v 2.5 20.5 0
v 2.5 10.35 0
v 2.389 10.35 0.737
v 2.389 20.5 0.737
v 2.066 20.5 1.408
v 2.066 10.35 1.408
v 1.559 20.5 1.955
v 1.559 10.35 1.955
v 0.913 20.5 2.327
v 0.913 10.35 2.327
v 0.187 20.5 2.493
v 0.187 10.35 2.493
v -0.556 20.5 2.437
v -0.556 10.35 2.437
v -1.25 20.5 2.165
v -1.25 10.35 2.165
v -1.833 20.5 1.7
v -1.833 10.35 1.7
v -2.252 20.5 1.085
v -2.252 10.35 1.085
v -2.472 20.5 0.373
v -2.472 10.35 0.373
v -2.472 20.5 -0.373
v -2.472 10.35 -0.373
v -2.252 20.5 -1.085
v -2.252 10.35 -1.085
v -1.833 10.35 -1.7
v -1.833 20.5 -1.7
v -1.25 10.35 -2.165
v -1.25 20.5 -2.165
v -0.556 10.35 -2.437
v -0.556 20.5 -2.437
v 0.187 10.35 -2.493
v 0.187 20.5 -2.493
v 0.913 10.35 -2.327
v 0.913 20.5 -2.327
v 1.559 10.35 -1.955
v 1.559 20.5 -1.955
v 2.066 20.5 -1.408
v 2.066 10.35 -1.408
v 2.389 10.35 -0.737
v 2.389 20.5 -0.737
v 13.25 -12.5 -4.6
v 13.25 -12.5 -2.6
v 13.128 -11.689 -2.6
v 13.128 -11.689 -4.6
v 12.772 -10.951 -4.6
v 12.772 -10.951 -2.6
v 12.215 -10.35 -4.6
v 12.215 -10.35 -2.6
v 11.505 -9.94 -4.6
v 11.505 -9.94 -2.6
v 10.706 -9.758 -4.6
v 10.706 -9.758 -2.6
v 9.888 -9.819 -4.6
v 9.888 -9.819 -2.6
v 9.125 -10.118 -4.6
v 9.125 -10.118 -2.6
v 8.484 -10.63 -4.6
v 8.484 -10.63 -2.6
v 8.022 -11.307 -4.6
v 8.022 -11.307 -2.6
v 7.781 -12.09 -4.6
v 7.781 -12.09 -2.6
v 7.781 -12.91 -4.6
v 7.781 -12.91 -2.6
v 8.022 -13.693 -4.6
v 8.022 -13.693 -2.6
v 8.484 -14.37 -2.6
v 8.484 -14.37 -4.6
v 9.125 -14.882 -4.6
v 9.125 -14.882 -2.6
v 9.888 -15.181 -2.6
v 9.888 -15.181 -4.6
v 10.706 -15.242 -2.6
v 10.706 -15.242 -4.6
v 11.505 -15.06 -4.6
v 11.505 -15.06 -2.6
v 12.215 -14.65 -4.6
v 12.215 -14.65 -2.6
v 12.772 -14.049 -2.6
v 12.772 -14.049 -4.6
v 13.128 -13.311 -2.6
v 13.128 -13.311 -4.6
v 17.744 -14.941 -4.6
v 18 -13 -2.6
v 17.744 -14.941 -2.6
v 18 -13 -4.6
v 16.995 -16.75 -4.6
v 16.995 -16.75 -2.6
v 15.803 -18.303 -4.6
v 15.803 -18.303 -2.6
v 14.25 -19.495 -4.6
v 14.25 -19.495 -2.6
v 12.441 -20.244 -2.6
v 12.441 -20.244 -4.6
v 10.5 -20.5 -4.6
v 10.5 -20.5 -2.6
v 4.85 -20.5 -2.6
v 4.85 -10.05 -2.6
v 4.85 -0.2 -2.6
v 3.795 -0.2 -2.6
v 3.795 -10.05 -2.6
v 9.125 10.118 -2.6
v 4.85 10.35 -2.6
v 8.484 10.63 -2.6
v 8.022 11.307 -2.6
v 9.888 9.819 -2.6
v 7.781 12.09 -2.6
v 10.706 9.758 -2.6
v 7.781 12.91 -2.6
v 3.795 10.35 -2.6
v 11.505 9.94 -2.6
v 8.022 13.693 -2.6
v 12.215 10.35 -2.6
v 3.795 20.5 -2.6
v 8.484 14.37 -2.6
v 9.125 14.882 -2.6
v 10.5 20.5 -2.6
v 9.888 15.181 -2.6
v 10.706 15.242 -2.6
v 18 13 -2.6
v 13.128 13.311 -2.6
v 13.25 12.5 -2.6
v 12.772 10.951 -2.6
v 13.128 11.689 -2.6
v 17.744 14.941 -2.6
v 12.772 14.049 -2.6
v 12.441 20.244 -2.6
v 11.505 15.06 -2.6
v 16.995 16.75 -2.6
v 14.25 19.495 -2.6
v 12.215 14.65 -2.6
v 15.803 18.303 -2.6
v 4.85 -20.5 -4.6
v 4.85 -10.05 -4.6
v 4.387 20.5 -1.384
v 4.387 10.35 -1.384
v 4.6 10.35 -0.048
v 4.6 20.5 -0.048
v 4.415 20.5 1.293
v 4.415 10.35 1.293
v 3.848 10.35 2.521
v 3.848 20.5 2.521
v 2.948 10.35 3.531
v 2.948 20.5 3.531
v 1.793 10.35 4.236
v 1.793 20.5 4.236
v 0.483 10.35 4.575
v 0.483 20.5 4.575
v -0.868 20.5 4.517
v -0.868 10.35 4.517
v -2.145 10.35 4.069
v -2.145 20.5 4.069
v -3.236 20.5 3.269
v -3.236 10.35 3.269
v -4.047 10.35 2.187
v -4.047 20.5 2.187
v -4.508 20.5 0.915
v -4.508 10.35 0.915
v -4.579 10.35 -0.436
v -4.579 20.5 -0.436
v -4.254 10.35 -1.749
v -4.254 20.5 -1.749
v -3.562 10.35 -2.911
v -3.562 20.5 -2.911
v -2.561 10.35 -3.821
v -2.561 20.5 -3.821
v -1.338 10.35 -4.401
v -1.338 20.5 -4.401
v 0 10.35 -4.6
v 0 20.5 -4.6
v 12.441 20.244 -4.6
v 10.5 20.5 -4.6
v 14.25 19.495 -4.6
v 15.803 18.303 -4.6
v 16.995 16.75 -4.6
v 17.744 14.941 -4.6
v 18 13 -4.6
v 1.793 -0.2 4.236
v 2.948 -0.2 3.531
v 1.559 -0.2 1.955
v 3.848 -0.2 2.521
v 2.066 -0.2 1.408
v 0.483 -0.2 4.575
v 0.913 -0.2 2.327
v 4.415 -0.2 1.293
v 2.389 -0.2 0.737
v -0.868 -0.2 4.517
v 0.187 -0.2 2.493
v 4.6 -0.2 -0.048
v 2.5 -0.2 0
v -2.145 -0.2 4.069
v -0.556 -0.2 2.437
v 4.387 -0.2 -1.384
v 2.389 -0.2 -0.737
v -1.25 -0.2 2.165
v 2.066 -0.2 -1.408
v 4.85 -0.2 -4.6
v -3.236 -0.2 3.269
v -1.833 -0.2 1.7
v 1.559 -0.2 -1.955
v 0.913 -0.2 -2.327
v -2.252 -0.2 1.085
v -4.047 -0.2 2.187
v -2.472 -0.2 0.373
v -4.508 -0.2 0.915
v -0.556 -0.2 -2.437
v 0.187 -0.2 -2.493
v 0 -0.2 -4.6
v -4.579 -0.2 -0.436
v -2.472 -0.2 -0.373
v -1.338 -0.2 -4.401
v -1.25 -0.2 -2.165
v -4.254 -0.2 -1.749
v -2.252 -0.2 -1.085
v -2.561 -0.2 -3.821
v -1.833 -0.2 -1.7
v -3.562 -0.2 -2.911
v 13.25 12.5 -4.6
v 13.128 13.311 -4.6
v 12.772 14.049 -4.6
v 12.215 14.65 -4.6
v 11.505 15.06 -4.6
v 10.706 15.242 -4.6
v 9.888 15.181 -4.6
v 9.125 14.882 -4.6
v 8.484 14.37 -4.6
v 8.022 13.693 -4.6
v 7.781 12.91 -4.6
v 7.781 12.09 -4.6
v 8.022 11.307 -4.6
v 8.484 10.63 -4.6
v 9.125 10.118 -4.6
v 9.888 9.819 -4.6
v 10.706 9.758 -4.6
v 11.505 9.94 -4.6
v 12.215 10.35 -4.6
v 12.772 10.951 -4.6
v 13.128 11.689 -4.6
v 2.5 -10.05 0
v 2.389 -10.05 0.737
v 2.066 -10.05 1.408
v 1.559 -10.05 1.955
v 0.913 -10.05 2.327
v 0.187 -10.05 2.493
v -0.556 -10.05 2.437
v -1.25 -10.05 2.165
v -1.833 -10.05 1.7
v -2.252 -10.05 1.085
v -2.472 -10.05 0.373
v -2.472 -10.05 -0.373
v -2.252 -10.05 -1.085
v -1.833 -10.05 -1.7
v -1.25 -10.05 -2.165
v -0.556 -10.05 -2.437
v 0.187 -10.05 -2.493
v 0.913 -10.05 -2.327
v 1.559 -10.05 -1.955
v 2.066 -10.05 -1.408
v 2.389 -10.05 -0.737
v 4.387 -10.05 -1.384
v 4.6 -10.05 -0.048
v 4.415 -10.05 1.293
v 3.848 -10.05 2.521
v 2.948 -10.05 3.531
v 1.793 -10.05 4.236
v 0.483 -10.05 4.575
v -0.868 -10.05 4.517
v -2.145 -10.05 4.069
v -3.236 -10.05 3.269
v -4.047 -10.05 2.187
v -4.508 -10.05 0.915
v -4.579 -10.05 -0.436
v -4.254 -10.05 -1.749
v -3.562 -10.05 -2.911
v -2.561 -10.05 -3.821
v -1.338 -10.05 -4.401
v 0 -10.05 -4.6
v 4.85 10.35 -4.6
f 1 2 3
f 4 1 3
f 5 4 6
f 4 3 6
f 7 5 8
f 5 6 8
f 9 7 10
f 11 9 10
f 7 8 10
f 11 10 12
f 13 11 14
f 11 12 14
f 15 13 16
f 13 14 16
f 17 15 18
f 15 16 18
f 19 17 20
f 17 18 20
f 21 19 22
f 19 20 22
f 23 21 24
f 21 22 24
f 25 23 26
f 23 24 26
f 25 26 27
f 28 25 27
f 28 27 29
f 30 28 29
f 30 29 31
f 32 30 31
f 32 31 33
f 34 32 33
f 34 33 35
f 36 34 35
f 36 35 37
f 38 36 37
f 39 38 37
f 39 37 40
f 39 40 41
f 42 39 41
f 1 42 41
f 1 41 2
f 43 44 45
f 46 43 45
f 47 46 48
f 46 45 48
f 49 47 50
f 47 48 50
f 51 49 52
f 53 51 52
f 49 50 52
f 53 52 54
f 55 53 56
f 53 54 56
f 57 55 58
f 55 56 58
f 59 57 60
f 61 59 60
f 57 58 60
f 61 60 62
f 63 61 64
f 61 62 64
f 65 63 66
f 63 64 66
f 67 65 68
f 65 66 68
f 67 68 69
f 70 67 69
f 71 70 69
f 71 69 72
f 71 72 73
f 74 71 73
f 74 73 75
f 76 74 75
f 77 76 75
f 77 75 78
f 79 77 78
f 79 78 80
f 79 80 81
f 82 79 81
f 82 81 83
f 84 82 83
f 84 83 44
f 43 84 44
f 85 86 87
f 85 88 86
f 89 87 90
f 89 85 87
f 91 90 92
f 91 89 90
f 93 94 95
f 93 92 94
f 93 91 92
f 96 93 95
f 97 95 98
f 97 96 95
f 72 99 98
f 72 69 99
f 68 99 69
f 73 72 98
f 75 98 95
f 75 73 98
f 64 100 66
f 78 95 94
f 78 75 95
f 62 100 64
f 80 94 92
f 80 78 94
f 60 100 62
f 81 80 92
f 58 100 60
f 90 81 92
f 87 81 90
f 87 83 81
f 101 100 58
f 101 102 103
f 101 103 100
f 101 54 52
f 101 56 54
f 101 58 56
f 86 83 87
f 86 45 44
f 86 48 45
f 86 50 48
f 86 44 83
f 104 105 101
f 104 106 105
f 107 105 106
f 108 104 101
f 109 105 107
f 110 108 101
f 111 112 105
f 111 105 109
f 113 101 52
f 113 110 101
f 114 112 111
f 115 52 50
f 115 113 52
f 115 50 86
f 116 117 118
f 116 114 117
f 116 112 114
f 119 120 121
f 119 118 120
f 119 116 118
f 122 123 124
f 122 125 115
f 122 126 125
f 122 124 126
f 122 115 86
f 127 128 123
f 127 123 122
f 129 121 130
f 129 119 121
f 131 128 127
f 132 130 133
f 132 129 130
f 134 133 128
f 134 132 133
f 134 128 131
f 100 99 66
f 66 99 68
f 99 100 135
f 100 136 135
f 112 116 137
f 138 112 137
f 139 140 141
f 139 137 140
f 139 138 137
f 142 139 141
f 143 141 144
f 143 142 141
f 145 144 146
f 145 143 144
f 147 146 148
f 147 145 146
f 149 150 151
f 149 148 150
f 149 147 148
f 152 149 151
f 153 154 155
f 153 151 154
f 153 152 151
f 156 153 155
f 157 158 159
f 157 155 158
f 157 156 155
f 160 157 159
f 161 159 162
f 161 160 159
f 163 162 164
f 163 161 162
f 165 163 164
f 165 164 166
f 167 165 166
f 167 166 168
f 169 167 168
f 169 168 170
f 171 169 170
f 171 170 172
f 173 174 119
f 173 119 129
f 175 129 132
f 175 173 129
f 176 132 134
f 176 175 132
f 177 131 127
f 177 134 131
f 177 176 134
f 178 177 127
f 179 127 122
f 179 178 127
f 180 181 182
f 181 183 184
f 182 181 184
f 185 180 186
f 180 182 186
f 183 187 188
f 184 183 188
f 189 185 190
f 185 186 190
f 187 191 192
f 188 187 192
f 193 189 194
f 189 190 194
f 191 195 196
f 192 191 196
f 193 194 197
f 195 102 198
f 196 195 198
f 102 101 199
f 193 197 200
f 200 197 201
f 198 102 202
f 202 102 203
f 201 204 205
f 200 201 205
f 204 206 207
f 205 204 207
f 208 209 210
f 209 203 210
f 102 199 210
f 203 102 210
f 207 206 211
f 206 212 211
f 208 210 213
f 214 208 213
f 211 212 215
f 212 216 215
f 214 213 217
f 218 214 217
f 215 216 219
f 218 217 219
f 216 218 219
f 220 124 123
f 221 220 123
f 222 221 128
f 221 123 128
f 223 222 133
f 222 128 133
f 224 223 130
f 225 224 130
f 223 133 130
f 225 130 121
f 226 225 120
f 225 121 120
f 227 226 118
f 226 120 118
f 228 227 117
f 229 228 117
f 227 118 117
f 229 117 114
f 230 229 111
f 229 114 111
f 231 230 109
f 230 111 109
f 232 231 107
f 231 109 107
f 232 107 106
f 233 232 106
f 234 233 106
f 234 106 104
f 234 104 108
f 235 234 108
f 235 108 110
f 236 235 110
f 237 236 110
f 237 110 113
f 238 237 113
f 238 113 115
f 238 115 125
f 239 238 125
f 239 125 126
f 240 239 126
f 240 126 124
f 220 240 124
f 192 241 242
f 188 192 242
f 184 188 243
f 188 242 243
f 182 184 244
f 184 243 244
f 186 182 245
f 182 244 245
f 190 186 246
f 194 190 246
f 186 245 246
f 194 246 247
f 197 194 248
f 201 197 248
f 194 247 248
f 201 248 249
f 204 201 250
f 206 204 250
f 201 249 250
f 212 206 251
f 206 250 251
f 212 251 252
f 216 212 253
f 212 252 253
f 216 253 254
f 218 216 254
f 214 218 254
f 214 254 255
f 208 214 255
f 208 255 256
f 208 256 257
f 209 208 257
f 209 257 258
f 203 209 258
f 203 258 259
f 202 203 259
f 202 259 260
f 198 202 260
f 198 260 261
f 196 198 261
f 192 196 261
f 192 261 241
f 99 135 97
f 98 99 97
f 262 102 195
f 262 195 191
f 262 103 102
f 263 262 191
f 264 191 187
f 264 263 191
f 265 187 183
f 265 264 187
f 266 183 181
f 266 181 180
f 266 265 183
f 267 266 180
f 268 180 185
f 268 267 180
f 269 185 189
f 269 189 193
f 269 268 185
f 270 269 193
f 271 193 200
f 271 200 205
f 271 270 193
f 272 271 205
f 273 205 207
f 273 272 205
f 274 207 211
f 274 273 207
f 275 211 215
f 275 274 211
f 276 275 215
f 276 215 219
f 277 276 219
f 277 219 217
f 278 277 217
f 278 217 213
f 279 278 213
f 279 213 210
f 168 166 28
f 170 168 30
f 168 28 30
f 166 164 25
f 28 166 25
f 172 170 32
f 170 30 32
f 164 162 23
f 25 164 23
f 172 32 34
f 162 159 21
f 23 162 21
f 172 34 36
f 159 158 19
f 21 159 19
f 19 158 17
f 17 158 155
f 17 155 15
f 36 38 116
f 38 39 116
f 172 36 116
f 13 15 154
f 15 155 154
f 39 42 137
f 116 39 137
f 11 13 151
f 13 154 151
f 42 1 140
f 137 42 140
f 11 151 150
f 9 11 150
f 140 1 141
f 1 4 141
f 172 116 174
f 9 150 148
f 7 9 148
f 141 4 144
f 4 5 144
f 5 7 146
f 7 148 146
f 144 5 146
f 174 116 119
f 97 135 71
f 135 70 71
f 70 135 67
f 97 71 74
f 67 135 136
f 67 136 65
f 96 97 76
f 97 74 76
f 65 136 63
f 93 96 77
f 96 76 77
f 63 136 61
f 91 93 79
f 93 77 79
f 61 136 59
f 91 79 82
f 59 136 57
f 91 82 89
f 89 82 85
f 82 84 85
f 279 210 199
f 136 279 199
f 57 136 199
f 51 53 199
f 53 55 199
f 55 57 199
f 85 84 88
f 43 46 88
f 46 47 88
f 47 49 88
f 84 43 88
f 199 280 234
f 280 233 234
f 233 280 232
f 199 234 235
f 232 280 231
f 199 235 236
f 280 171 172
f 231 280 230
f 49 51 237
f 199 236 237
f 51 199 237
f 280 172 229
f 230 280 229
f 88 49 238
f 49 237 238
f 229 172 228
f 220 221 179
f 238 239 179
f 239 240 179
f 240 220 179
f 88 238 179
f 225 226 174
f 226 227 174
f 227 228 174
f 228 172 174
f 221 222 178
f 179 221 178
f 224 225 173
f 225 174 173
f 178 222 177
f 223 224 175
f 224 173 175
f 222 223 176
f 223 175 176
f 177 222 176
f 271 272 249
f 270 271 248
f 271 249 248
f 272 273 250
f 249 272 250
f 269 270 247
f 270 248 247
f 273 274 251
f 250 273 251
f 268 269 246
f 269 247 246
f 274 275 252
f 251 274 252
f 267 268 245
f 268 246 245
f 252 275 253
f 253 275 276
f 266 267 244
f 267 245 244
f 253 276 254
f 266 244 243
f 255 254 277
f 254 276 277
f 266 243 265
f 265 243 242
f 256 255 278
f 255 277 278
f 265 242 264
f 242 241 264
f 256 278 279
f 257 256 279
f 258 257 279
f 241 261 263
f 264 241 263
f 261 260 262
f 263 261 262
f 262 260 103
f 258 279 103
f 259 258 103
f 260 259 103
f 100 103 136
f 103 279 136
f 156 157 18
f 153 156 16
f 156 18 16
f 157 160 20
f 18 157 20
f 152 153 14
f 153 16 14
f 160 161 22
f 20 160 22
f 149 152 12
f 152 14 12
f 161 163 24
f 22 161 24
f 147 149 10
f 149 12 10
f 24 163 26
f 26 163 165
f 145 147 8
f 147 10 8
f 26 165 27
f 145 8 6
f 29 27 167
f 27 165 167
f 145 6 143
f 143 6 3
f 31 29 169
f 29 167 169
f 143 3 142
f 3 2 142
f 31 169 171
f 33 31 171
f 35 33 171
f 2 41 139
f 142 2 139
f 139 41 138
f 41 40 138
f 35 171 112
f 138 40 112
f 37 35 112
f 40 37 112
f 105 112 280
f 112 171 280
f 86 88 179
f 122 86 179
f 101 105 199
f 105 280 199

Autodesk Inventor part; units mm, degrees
sketch "Sketch_1" plane through (0, 0, 0) normal (0, 0, 1) x (1, 0, 0)
  line L0 (0, -20.5) -> (0, 20.5)
  line L1 (0, 20.5) -> (4.6, 20.5)
  line L2 (4.6, 20.5) -> (4.6, -20.5)
  line L3 (4.6, -20.5) -> (0, -20.5)
  line L4 (0, -20.5) -> (0, 20.5)
revolve "Revolution1" add sketch "Sketch_1" angle 360 about axis through (0, -20.5, 0) along (0, -1, 0)
sketch "Sketch_2" plane through (0, 0, -4.6) normal (0, 0, 1) x (1, 0, 0)
  line L0 (0, 20.5) -> (0, -20.5)
  line L1 (0, -20.5) -> (10.5, -20.5)
  arc A0 (10.5, -20.5) -> (18, -13) centre (10.5, -13) ccw
  line L2 (18, -13) -> (18, 13)
  arc A1 (18, 13) -> (10.5, 20.5) centre (10.5, 13) ccw
  line L3 (10.5, 20.5) -> (0, 20.5)
extrude "Extrusion1" add sketch "Sketch_2" along normal blind 2
sketch "Sketch_3" plane through (0, 0, 0) normal (0, 0, 1) x (1, 0, 0)
  line L0 (-41, 41) -> (-41, -41)
  line L1 (-41, -41) -> (41, -41)
  line L2 (41, -41) -> (41, 41)
  line L3 (41, 41) -> (-41, 41)
  line L4 (-4.6, 20.5) -> (-4.6, 10.35)
  line L5 (-4.6, 10.35) -> (4.85, 10.35)
  line L6 (4.85, 10.35) -> (4.85, -0.2)
  line L7 (4.85, -0.2) -> (-4.6, -0.2)
  line L8 (-4.6, -0.2) -> (-4.6, -10.05)
  line L9 (-4.6, -10.05) -> (4.85, -10.05)
  line L10 (4.85, -10.05) -> (4.85, -20.5)
  line L11 (4.85, -20.5) -> (18, -20.5)
  line L12 (18, -20.5) -> (18, 20.5)
  line L13 (18, 20.5) -> (-4.6, 20.5)
extrude "Extrusion2" cut sketch "Sketch_3" along normal mid plane 82
sketch "Sketch_4" plane through (0, 0, 0) normal (0, 0, 1) x (1, 0, 0)
  line L0 (0, -20.5) -> (0, 20.5)
  line L1 (0, 20.5) -> (2.5, 20.5)
  line L2 (2.5, 20.5) -> (2.5, -20.5)
  line L3 (2.5, -20.5) -> (0, -20.5)
  line L4 (0, -20.5) -> (0, 20.5)
revolve "Revolution2" cut sketch "Sketch_4" angle 360 about axis through (0, -20.5, 0) along (0, -1, 0)
sketch "Sketch_5" plane through (0, 12.5, 0) normal (0, 1, 0) x (1, 0, 0)
  line L0 (10.5, 2.6) -> (10.5, 4.6)
  line L1 (10.5, 4.6) -> (13.25, 4.6)
  line L2 (13.25, 4.6) -> (13.25, 2.6)
  line L3 (13.25, 2.6) -> (10.5, 2.6)
  line L4 (10.5, 2.6) -> (10.5, 4.6)
revolve "Revolution3" cut sketch "Sketch_5" angle 360 about axis through (10.5, 12.5, -2.6) along (0, 0, 1)
sketch "Sketch_7" plane through (0, -12.5, 0) normal (0, 1, 0) x (1, 0, 0)
  line L0 (10.5, 2.6) -> (10.5, 4.6)
  line L1 (10.5, 4.6) -> (13.25, 4.6)
  line L2 (13.25, 4.6) -> (13.25, 2.6)
  line L3 (13.25, 2.6) -> (10.5, 2.6)
  line L4 (10.5, 2.6) -> (10.5, 4.6)
revolve "Revolution4" cut sketch "Sketch_7" angle 360 about axis through (10.5, -12.5, -2.6) along (0, 0, 1)
ref_plane "r_pin_XY" through (0, 0, 0) normal (0, 1, 0) x (1, 0, 0)
ref_plane "r_pin_YZ" through (0, 0, 0) normal (1, 0, 0) x (0, 0, -1)
ref_plane "r_pin_ZX" through (0, 0, 0) normal (0, 0, -1) x (0, 1, 0)
ref_plane "hole1r_to_bolt_XY" through (10.5, 12.5, -2.6) normal (0, 0, 1) x (1, 0, 0)
ref_plane "hole1r_to_bolt_YZ" through (10.5, 12.5, -2.6) normal (1, 0, 0) x (0, 1, 0)
ref_plane "hole1r_to_bolt_ZX" through (10.5, 12.5, -2.6) normal (0, 1, 0) x (0, 0, 1)
ref_plane "hole2r_to_bolt_XY" through (10.5, -12.5, -2.6) normal (0, 0, 1) x (1, 0, 0)
ref_plane "hole2r_to_bolt_YZ" through (10.5, -12.5, -2.6) normal (1, 0, 0) x (0, 1, 0)
ref_plane "hole2r_to_bolt_ZX" through (10.5, -12.5, -2.6) normal (0, 1, 0) x (0, 0, 1)
ref_plane "hole3r_to_bolt_XY" through (10.5, 0, -2.6) normal (0, 0, 1) x (1, 0, 0)
ref_plane "hole3r_to_bolt_YZ" through (10.5, 0, -2.6) normal (1, 0, 0) x (0, 1, 0)
ref_plane "hole3r_to_bolt_ZX" through (10.5, 0, -2.6) normal (0, 1, 0) x (0, 0, 1)
properties part number "SHHPS5-2-pin"
